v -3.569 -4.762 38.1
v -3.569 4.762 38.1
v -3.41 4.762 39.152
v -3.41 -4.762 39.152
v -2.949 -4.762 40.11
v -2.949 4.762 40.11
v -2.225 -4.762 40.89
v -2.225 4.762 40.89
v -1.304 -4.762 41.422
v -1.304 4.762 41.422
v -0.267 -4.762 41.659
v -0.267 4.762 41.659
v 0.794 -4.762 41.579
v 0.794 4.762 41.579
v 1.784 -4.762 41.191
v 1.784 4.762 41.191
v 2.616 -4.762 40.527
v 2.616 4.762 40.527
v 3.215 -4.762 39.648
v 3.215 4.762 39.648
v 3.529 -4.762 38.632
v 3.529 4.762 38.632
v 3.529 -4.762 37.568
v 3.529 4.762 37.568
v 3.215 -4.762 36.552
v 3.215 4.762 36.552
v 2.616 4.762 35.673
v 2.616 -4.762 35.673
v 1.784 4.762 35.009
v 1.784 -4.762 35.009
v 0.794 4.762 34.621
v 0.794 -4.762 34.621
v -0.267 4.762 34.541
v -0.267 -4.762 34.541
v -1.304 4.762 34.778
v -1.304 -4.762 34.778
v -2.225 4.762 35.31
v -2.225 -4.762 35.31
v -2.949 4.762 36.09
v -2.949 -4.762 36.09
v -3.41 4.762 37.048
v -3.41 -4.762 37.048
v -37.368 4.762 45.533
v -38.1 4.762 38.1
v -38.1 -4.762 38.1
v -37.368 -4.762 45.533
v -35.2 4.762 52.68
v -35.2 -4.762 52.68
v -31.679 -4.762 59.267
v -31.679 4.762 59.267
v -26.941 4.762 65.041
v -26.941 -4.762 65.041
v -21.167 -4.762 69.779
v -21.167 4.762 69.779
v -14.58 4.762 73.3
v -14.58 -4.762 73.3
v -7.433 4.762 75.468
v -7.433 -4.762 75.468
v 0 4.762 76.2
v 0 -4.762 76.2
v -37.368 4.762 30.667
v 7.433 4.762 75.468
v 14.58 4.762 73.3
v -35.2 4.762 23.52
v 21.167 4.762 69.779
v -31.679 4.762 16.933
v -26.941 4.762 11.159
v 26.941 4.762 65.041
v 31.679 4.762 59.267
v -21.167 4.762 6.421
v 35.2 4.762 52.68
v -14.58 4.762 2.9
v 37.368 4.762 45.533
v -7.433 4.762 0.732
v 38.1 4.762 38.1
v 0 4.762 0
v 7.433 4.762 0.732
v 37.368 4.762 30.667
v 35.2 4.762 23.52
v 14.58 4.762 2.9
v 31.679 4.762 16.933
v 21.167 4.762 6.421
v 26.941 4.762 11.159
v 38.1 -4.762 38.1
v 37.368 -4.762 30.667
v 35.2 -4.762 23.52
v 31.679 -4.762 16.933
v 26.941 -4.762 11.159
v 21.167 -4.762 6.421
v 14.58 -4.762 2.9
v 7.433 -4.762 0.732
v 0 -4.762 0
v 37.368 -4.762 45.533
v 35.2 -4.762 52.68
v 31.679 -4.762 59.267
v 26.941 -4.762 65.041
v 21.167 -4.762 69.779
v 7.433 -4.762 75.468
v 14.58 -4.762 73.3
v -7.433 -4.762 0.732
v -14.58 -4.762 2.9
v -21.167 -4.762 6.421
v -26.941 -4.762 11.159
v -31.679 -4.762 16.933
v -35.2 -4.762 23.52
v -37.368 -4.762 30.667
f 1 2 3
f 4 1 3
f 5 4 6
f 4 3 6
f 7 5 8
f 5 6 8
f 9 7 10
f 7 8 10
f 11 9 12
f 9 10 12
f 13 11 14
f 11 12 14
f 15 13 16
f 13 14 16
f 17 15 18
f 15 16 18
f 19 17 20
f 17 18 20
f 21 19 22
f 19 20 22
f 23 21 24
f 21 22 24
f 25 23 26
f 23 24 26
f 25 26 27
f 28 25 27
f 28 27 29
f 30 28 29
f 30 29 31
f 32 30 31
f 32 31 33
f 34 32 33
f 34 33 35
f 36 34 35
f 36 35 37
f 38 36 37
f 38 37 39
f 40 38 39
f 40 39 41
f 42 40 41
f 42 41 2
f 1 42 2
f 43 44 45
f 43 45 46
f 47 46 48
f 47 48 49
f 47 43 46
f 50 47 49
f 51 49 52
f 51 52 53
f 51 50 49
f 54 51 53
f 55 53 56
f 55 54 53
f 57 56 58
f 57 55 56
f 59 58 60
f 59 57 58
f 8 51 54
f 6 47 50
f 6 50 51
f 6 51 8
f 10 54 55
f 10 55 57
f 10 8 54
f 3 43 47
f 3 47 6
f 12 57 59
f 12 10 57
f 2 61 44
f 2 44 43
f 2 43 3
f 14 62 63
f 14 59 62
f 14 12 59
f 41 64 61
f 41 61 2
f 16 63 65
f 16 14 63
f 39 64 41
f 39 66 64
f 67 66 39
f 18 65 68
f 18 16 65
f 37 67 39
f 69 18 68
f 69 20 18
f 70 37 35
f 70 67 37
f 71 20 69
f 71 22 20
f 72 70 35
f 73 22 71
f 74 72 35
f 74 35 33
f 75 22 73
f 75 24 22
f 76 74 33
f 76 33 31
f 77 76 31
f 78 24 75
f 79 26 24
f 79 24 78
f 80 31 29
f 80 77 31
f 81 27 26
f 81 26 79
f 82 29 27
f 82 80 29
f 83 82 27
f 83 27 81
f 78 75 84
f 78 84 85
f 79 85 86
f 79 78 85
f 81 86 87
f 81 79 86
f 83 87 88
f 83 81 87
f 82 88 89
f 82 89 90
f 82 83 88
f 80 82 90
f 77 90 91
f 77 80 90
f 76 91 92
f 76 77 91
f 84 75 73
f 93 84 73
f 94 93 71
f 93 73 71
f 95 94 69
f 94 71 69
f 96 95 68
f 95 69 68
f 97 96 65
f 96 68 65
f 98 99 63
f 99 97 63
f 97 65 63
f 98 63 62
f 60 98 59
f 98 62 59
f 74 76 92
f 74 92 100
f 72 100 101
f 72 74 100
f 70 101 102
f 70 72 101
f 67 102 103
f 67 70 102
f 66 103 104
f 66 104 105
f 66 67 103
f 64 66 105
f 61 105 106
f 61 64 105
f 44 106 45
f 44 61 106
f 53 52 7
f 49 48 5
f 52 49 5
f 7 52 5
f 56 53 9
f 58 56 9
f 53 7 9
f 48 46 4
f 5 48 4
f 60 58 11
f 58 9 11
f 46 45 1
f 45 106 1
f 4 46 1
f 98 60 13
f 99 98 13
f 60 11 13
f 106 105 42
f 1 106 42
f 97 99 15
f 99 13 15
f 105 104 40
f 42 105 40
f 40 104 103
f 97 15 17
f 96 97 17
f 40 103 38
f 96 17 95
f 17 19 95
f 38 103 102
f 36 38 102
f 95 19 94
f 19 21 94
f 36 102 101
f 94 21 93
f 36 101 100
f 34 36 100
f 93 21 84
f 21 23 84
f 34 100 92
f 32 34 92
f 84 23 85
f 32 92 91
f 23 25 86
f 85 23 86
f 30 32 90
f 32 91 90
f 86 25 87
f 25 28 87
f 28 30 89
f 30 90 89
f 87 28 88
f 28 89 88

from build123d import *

# Parameters (mm, degrees)
SKETCH3_W           = 76.2
SKETCH3_H           = 9.525
BOSS_EXTRUDE1_DEPTH = 76.2
SKETCH4_R           = 3.5687
CUT_EXTRUDE2_DEPTH  = 86.725
CUT_EXTRUDE4_DEPTH  = 12.7
CUT_EXTRUDE6_DEPTH  = 12.7
CUT_EXTRUDE9_DEPTH  = 12.7
CUT_EXTRUDE10_DEPTH = 12.7


with BuildPart() as part:
    # Sketch3 → Boss-Extrude1 (new body)
    with BuildSketch(Plane.XY):
        Rectangle(SKETCH3_W, SKETCH3_H)
    extrude(amount=BOSS_EXTRUDE1_DEPTH)

    # Sketch4 → Cut-Extrude2 (cut, through all)
    with BuildSketch(Plane(origin=(0, 4.7625, 0), x_dir=(1, 0, 0), z_dir=(0, 1, 0))):
        with Locations(Location((0, -38.1, 0), (0, 0, 180))):
            Circle(SKETCH4_R)
    extrude(amount=-CUT_EXTRUDE2_DEPTH, mode=Mode.SUBTRACT)

    # Sketch5 → Cut-Extrude4 (cut)
    with BuildSketch(Plane(origin=(0, 4.7625, 0), x_dir=(1, 0, 0), z_dir=(0, 1, 0))):
        with BuildLine():
            Line((-38.1, -38.1), (-38.1, 0))
            Line((-38.1, 0), (0, 0))
            ThreePointArc((0, 0), (-26.940768363, -11.159231637), (-38.1, -38.1))
        make_face()
    extrude(amount=-CUT_EXTRUDE4_DEPTH, mode=Mode.SUBTRACT)

    # Sketch7 → Cut-Extrude6 (cut)
    with BuildSketch(Plane(origin=(0, 4.7625, 0), x_dir=(1, 0, 0), z_dir=(0, 1, 0))):
        with BuildLine():
            Line((0, 0), (38.1, 0))
            Line((38.1, 0), (38.1, -38.1))
            ThreePointArc((38.1, -38.1), (26.940768363, -11.159231637), (0, 0))
        make_face()
    extrude(amount=-CUT_EXTRUDE6_DEPTH, mode=Mode.SUBTRACT)

    # Sketch8 → Cut-Extrude9 (cut)
    with BuildSketch(Plane(origin=(0, 4.7625, 0), x_dir=(1, 0, 0), z_dir=(0, 1, 0))):
        with BuildLine():
            Line((38.1, -76.2), (38.1, -38.1))
            ThreePointArc((38.1, -38.1), (26.940768363, -65.040768363), (0, -76.2))
            Line((0, -76.2), (38.1, -76.2))
        make_face()
    extrude(amount=-CUT_EXTRUDE9_DEPTH, mode=Mode.SUBTRACT)

    # Sketch9 → Cut-Extrude10 (cut)
    with BuildSketch(Plane(origin=(0, 4.7625, 0), x_dir=(1, 0, 0), z_dir=(0, 1, 0))):
        with BuildLine():
            Line((0, -76.2), (-38.1, -76.2))
            Line((-38.1, -76.2), (-38.1, -38.1))
            ThreePointArc((-38.1, -38.1), (-26.940768363, -65.040768363), (0, -76.2))
        make_face()
    extrude(amount=-CUT_EXTRUDE10_DEPTH, mode=Mode.SUBTRACT)


solid = part.part
